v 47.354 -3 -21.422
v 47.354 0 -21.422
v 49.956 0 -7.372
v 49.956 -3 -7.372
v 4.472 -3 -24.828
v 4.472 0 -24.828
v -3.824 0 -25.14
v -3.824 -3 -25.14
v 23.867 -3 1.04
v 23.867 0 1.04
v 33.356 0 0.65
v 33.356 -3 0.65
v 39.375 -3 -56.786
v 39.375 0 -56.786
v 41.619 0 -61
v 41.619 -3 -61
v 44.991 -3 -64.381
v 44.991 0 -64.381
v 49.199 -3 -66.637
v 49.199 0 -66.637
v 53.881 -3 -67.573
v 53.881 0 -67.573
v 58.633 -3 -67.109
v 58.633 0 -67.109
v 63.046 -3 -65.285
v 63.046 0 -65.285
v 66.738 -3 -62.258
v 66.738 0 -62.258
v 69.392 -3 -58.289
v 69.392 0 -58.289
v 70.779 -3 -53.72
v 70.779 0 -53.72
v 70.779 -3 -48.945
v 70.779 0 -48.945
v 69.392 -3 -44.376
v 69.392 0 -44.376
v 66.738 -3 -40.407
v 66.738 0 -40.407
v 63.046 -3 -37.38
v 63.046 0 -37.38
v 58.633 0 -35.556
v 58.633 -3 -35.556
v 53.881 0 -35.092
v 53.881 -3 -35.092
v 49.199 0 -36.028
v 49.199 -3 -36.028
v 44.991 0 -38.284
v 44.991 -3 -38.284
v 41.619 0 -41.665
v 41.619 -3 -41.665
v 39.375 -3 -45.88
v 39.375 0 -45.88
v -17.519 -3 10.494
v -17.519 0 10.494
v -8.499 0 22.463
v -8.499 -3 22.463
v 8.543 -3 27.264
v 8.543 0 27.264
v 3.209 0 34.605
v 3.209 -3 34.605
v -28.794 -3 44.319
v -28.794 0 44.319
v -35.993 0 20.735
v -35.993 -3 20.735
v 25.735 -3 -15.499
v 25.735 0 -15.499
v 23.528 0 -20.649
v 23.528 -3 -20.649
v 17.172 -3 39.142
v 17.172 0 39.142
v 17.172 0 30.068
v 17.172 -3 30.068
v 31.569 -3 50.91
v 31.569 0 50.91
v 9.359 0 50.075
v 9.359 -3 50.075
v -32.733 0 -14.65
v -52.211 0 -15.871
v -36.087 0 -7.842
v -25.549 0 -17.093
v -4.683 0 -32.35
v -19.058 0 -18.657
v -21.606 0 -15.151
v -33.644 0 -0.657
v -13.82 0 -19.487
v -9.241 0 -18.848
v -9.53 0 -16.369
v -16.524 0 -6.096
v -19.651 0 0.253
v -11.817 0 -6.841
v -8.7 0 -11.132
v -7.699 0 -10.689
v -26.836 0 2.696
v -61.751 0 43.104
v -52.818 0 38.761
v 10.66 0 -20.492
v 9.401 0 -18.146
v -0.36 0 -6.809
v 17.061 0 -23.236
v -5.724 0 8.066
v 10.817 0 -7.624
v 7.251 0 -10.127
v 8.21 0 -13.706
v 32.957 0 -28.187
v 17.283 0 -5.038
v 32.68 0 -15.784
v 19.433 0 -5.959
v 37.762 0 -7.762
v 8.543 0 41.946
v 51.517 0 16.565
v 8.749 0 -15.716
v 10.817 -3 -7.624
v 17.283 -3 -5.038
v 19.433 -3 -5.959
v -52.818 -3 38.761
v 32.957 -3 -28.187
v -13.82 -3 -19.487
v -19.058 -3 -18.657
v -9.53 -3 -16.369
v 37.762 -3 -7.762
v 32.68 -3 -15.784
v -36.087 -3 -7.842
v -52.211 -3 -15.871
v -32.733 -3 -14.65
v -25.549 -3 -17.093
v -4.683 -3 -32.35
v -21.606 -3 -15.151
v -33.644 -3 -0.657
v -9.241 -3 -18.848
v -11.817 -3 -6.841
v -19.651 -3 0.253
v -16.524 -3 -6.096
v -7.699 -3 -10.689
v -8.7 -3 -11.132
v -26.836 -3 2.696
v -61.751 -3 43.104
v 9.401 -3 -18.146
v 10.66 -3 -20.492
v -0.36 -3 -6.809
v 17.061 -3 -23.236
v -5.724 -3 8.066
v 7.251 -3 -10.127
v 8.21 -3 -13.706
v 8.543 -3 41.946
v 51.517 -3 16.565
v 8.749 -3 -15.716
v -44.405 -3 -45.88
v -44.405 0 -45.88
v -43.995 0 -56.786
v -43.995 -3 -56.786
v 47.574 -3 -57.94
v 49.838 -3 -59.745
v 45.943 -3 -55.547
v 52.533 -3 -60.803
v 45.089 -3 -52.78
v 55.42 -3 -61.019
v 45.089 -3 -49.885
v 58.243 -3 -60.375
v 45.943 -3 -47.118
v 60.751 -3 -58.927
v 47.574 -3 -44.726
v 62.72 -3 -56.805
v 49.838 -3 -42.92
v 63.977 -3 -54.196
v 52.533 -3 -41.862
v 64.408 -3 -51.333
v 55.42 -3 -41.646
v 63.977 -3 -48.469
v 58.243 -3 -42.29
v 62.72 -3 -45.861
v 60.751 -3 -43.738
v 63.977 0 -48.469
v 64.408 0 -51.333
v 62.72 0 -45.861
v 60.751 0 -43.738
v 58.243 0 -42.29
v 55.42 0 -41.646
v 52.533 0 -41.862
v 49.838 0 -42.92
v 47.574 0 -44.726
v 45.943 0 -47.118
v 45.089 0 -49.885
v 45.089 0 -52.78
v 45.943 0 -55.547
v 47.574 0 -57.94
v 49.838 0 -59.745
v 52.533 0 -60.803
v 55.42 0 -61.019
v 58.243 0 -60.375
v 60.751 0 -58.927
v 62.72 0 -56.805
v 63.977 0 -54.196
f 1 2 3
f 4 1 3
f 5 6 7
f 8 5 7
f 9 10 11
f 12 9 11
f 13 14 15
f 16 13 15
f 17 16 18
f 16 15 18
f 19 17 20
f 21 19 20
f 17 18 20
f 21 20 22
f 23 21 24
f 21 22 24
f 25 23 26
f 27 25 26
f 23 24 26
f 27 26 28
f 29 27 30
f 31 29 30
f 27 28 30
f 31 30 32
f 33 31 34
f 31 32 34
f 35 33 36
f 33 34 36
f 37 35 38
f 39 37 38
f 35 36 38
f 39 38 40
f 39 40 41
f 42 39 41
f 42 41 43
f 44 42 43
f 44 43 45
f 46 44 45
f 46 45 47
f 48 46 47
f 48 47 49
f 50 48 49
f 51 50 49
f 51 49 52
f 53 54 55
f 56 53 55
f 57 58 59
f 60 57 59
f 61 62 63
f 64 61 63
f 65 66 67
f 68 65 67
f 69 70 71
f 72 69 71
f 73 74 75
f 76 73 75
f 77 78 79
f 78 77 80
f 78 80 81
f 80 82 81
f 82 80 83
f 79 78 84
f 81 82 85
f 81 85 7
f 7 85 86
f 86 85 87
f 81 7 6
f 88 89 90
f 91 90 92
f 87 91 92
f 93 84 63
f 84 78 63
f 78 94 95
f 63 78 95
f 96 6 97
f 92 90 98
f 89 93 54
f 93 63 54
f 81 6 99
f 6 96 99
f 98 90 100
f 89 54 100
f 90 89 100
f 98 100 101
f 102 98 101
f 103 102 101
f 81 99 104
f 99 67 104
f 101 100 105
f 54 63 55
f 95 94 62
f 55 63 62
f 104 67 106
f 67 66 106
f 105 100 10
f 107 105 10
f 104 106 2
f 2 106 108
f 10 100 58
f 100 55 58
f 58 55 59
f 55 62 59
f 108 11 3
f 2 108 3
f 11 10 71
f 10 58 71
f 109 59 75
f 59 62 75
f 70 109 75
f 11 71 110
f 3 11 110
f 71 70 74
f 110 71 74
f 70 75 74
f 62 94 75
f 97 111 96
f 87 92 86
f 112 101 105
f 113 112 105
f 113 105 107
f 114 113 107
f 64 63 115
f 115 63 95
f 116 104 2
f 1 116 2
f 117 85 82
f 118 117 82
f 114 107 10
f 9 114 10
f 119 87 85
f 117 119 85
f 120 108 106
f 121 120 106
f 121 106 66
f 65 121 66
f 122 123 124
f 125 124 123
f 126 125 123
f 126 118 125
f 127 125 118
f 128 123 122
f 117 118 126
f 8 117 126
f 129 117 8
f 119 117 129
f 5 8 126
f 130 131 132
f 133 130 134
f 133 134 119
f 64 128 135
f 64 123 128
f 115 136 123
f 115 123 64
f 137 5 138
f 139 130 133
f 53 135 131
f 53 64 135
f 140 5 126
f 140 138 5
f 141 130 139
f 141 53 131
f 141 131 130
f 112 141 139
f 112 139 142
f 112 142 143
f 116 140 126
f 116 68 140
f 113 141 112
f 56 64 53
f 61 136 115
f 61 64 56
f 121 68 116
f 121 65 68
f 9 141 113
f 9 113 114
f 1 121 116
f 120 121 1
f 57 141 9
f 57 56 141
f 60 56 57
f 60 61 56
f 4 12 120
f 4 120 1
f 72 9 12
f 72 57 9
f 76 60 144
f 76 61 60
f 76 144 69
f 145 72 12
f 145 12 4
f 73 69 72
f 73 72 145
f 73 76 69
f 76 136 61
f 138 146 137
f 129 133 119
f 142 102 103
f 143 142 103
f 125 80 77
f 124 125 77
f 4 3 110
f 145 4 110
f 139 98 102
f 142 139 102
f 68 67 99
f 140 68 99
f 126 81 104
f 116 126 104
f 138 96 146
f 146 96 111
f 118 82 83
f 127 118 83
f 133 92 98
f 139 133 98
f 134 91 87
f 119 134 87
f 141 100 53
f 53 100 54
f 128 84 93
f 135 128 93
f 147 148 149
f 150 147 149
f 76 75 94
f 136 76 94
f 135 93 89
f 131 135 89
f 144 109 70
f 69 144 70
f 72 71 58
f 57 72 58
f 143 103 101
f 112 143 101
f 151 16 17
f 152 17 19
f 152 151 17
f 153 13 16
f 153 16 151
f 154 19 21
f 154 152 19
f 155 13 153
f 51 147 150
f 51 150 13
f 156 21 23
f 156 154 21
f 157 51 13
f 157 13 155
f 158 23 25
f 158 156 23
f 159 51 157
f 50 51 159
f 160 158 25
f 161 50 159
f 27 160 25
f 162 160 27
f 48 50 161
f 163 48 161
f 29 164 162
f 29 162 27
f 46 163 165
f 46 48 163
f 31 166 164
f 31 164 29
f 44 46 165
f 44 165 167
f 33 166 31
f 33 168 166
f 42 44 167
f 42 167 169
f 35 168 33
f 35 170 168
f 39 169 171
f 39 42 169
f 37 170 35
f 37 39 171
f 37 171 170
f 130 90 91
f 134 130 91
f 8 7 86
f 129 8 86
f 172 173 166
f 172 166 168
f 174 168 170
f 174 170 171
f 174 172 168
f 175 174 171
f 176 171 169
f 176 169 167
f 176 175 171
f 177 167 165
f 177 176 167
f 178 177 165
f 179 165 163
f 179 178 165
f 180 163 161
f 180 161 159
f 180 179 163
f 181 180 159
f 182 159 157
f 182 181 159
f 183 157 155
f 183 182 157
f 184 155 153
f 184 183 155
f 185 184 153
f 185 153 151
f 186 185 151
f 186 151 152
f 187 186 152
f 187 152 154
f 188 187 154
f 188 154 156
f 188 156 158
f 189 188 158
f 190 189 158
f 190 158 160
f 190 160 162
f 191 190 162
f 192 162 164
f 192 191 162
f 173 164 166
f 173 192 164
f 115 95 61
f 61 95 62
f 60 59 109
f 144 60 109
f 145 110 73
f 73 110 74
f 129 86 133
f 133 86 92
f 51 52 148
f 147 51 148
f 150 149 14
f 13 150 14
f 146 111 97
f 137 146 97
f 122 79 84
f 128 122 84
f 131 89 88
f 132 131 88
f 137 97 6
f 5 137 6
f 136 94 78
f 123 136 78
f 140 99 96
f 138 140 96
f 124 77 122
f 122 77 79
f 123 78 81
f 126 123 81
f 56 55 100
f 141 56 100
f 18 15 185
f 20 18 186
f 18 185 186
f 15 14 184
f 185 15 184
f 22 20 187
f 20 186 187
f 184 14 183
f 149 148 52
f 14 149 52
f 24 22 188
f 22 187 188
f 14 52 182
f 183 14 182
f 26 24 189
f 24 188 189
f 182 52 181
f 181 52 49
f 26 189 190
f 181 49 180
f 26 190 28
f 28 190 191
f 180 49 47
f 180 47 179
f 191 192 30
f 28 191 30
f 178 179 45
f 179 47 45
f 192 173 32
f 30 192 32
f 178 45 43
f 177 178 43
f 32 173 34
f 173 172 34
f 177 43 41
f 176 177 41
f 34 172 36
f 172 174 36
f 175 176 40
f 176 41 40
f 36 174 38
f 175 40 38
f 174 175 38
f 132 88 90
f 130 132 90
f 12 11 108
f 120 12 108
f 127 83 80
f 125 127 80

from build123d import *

# Parameters (mm, degrees)
F0_R     = 9.713783
F1_DEPTH = 3


with BuildPart() as f1:
    # F0 (on Front) → F1 (new body)
    with BuildSketch(Plane.XZ):
        Polygon((9.359013, 50.074677), (-61.751101, 43.104354), (-52.210905, -15.871422), (-4.68337, -32.349944), (32.957047, -28.186951), (47.354076, -21.422081), (49.955949, -7.371972), (51.517073, 16.565254), (31.569384, 50.90997), align=None)
        Polygon((-19.650957, 0.252964), (-16.523882, -6.095946), (-11.817468, -6.841368), (-8.700382, -11.131669), (-9.52997, -16.369483), (-13.820271, -19.486569), (-19.058085, -18.656981), (-21.605504, -15.150759), (-25.548534, -17.092848), (-32.733405, -14.649991), (-36.086515, -7.84216), (-33.643659, -0.657289), (-26.835827, 2.695821), align=None, mode=Mode.SUBTRACT)
        Polygon((-0.359567, -6.808609), (7.250806, -10.127254), (8.210497, -13.706142), (10.816917, -7.624497), (17.283304, -5.037943), (19.433067, -5.959271), (23.867252, 1.040298), (33.355706, 0.650243), (37.762135, -7.762027), (32.680111, -15.784241), (25.735128, -15.498744), (23.527797, -20.649182), (17.06141, -23.235736), (10.660015, -20.49228), (8.749334, -15.715578), (9.401175, -18.146425), (4.472267, -24.827523), (-3.824349, -25.139544), (-9.241152, -18.84753), (-7.699179, -10.689496), align=None, mode=Mode.SUBTRACT)
        Polygon((-5.724119, 8.065804), (-17.519275, 10.494218), (-8.49945, 22.462832), align=None, mode=Mode.SUBTRACT)
        Polygon((-28.794058, 44.318561), (-35.993011, 20.734928), (-52.817559, 38.761221), align=None, mode=Mode.SUBTRACT)
        Polygon((8.54268, 41.945745), (17.172357, 39.141793), (17.172357, 30.068014), (8.54268, 27.264062), (3.209247, 34.604903), align=None, mode=Mode.SUBTRACT)
        with BuildLine():
            Line((39.375, -45.879681), (-44.405285, -45.879681))
            Line((-44.405285, -45.879681), (-43.995133, -56.785595))
            Line((-43.995133, -56.785595), (39.375, -56.785595))
            ThreePointArc((39.375, -56.785595), (70.955485, -51.332638), (39.375, -45.879681))
        make_face()
        with Locations((54.694465, -51.332638)):
            Circle(F0_R, mode=Mode.SUBTRACT)
    extrude(amount=F1_DEPTH)


solid = f1.part
